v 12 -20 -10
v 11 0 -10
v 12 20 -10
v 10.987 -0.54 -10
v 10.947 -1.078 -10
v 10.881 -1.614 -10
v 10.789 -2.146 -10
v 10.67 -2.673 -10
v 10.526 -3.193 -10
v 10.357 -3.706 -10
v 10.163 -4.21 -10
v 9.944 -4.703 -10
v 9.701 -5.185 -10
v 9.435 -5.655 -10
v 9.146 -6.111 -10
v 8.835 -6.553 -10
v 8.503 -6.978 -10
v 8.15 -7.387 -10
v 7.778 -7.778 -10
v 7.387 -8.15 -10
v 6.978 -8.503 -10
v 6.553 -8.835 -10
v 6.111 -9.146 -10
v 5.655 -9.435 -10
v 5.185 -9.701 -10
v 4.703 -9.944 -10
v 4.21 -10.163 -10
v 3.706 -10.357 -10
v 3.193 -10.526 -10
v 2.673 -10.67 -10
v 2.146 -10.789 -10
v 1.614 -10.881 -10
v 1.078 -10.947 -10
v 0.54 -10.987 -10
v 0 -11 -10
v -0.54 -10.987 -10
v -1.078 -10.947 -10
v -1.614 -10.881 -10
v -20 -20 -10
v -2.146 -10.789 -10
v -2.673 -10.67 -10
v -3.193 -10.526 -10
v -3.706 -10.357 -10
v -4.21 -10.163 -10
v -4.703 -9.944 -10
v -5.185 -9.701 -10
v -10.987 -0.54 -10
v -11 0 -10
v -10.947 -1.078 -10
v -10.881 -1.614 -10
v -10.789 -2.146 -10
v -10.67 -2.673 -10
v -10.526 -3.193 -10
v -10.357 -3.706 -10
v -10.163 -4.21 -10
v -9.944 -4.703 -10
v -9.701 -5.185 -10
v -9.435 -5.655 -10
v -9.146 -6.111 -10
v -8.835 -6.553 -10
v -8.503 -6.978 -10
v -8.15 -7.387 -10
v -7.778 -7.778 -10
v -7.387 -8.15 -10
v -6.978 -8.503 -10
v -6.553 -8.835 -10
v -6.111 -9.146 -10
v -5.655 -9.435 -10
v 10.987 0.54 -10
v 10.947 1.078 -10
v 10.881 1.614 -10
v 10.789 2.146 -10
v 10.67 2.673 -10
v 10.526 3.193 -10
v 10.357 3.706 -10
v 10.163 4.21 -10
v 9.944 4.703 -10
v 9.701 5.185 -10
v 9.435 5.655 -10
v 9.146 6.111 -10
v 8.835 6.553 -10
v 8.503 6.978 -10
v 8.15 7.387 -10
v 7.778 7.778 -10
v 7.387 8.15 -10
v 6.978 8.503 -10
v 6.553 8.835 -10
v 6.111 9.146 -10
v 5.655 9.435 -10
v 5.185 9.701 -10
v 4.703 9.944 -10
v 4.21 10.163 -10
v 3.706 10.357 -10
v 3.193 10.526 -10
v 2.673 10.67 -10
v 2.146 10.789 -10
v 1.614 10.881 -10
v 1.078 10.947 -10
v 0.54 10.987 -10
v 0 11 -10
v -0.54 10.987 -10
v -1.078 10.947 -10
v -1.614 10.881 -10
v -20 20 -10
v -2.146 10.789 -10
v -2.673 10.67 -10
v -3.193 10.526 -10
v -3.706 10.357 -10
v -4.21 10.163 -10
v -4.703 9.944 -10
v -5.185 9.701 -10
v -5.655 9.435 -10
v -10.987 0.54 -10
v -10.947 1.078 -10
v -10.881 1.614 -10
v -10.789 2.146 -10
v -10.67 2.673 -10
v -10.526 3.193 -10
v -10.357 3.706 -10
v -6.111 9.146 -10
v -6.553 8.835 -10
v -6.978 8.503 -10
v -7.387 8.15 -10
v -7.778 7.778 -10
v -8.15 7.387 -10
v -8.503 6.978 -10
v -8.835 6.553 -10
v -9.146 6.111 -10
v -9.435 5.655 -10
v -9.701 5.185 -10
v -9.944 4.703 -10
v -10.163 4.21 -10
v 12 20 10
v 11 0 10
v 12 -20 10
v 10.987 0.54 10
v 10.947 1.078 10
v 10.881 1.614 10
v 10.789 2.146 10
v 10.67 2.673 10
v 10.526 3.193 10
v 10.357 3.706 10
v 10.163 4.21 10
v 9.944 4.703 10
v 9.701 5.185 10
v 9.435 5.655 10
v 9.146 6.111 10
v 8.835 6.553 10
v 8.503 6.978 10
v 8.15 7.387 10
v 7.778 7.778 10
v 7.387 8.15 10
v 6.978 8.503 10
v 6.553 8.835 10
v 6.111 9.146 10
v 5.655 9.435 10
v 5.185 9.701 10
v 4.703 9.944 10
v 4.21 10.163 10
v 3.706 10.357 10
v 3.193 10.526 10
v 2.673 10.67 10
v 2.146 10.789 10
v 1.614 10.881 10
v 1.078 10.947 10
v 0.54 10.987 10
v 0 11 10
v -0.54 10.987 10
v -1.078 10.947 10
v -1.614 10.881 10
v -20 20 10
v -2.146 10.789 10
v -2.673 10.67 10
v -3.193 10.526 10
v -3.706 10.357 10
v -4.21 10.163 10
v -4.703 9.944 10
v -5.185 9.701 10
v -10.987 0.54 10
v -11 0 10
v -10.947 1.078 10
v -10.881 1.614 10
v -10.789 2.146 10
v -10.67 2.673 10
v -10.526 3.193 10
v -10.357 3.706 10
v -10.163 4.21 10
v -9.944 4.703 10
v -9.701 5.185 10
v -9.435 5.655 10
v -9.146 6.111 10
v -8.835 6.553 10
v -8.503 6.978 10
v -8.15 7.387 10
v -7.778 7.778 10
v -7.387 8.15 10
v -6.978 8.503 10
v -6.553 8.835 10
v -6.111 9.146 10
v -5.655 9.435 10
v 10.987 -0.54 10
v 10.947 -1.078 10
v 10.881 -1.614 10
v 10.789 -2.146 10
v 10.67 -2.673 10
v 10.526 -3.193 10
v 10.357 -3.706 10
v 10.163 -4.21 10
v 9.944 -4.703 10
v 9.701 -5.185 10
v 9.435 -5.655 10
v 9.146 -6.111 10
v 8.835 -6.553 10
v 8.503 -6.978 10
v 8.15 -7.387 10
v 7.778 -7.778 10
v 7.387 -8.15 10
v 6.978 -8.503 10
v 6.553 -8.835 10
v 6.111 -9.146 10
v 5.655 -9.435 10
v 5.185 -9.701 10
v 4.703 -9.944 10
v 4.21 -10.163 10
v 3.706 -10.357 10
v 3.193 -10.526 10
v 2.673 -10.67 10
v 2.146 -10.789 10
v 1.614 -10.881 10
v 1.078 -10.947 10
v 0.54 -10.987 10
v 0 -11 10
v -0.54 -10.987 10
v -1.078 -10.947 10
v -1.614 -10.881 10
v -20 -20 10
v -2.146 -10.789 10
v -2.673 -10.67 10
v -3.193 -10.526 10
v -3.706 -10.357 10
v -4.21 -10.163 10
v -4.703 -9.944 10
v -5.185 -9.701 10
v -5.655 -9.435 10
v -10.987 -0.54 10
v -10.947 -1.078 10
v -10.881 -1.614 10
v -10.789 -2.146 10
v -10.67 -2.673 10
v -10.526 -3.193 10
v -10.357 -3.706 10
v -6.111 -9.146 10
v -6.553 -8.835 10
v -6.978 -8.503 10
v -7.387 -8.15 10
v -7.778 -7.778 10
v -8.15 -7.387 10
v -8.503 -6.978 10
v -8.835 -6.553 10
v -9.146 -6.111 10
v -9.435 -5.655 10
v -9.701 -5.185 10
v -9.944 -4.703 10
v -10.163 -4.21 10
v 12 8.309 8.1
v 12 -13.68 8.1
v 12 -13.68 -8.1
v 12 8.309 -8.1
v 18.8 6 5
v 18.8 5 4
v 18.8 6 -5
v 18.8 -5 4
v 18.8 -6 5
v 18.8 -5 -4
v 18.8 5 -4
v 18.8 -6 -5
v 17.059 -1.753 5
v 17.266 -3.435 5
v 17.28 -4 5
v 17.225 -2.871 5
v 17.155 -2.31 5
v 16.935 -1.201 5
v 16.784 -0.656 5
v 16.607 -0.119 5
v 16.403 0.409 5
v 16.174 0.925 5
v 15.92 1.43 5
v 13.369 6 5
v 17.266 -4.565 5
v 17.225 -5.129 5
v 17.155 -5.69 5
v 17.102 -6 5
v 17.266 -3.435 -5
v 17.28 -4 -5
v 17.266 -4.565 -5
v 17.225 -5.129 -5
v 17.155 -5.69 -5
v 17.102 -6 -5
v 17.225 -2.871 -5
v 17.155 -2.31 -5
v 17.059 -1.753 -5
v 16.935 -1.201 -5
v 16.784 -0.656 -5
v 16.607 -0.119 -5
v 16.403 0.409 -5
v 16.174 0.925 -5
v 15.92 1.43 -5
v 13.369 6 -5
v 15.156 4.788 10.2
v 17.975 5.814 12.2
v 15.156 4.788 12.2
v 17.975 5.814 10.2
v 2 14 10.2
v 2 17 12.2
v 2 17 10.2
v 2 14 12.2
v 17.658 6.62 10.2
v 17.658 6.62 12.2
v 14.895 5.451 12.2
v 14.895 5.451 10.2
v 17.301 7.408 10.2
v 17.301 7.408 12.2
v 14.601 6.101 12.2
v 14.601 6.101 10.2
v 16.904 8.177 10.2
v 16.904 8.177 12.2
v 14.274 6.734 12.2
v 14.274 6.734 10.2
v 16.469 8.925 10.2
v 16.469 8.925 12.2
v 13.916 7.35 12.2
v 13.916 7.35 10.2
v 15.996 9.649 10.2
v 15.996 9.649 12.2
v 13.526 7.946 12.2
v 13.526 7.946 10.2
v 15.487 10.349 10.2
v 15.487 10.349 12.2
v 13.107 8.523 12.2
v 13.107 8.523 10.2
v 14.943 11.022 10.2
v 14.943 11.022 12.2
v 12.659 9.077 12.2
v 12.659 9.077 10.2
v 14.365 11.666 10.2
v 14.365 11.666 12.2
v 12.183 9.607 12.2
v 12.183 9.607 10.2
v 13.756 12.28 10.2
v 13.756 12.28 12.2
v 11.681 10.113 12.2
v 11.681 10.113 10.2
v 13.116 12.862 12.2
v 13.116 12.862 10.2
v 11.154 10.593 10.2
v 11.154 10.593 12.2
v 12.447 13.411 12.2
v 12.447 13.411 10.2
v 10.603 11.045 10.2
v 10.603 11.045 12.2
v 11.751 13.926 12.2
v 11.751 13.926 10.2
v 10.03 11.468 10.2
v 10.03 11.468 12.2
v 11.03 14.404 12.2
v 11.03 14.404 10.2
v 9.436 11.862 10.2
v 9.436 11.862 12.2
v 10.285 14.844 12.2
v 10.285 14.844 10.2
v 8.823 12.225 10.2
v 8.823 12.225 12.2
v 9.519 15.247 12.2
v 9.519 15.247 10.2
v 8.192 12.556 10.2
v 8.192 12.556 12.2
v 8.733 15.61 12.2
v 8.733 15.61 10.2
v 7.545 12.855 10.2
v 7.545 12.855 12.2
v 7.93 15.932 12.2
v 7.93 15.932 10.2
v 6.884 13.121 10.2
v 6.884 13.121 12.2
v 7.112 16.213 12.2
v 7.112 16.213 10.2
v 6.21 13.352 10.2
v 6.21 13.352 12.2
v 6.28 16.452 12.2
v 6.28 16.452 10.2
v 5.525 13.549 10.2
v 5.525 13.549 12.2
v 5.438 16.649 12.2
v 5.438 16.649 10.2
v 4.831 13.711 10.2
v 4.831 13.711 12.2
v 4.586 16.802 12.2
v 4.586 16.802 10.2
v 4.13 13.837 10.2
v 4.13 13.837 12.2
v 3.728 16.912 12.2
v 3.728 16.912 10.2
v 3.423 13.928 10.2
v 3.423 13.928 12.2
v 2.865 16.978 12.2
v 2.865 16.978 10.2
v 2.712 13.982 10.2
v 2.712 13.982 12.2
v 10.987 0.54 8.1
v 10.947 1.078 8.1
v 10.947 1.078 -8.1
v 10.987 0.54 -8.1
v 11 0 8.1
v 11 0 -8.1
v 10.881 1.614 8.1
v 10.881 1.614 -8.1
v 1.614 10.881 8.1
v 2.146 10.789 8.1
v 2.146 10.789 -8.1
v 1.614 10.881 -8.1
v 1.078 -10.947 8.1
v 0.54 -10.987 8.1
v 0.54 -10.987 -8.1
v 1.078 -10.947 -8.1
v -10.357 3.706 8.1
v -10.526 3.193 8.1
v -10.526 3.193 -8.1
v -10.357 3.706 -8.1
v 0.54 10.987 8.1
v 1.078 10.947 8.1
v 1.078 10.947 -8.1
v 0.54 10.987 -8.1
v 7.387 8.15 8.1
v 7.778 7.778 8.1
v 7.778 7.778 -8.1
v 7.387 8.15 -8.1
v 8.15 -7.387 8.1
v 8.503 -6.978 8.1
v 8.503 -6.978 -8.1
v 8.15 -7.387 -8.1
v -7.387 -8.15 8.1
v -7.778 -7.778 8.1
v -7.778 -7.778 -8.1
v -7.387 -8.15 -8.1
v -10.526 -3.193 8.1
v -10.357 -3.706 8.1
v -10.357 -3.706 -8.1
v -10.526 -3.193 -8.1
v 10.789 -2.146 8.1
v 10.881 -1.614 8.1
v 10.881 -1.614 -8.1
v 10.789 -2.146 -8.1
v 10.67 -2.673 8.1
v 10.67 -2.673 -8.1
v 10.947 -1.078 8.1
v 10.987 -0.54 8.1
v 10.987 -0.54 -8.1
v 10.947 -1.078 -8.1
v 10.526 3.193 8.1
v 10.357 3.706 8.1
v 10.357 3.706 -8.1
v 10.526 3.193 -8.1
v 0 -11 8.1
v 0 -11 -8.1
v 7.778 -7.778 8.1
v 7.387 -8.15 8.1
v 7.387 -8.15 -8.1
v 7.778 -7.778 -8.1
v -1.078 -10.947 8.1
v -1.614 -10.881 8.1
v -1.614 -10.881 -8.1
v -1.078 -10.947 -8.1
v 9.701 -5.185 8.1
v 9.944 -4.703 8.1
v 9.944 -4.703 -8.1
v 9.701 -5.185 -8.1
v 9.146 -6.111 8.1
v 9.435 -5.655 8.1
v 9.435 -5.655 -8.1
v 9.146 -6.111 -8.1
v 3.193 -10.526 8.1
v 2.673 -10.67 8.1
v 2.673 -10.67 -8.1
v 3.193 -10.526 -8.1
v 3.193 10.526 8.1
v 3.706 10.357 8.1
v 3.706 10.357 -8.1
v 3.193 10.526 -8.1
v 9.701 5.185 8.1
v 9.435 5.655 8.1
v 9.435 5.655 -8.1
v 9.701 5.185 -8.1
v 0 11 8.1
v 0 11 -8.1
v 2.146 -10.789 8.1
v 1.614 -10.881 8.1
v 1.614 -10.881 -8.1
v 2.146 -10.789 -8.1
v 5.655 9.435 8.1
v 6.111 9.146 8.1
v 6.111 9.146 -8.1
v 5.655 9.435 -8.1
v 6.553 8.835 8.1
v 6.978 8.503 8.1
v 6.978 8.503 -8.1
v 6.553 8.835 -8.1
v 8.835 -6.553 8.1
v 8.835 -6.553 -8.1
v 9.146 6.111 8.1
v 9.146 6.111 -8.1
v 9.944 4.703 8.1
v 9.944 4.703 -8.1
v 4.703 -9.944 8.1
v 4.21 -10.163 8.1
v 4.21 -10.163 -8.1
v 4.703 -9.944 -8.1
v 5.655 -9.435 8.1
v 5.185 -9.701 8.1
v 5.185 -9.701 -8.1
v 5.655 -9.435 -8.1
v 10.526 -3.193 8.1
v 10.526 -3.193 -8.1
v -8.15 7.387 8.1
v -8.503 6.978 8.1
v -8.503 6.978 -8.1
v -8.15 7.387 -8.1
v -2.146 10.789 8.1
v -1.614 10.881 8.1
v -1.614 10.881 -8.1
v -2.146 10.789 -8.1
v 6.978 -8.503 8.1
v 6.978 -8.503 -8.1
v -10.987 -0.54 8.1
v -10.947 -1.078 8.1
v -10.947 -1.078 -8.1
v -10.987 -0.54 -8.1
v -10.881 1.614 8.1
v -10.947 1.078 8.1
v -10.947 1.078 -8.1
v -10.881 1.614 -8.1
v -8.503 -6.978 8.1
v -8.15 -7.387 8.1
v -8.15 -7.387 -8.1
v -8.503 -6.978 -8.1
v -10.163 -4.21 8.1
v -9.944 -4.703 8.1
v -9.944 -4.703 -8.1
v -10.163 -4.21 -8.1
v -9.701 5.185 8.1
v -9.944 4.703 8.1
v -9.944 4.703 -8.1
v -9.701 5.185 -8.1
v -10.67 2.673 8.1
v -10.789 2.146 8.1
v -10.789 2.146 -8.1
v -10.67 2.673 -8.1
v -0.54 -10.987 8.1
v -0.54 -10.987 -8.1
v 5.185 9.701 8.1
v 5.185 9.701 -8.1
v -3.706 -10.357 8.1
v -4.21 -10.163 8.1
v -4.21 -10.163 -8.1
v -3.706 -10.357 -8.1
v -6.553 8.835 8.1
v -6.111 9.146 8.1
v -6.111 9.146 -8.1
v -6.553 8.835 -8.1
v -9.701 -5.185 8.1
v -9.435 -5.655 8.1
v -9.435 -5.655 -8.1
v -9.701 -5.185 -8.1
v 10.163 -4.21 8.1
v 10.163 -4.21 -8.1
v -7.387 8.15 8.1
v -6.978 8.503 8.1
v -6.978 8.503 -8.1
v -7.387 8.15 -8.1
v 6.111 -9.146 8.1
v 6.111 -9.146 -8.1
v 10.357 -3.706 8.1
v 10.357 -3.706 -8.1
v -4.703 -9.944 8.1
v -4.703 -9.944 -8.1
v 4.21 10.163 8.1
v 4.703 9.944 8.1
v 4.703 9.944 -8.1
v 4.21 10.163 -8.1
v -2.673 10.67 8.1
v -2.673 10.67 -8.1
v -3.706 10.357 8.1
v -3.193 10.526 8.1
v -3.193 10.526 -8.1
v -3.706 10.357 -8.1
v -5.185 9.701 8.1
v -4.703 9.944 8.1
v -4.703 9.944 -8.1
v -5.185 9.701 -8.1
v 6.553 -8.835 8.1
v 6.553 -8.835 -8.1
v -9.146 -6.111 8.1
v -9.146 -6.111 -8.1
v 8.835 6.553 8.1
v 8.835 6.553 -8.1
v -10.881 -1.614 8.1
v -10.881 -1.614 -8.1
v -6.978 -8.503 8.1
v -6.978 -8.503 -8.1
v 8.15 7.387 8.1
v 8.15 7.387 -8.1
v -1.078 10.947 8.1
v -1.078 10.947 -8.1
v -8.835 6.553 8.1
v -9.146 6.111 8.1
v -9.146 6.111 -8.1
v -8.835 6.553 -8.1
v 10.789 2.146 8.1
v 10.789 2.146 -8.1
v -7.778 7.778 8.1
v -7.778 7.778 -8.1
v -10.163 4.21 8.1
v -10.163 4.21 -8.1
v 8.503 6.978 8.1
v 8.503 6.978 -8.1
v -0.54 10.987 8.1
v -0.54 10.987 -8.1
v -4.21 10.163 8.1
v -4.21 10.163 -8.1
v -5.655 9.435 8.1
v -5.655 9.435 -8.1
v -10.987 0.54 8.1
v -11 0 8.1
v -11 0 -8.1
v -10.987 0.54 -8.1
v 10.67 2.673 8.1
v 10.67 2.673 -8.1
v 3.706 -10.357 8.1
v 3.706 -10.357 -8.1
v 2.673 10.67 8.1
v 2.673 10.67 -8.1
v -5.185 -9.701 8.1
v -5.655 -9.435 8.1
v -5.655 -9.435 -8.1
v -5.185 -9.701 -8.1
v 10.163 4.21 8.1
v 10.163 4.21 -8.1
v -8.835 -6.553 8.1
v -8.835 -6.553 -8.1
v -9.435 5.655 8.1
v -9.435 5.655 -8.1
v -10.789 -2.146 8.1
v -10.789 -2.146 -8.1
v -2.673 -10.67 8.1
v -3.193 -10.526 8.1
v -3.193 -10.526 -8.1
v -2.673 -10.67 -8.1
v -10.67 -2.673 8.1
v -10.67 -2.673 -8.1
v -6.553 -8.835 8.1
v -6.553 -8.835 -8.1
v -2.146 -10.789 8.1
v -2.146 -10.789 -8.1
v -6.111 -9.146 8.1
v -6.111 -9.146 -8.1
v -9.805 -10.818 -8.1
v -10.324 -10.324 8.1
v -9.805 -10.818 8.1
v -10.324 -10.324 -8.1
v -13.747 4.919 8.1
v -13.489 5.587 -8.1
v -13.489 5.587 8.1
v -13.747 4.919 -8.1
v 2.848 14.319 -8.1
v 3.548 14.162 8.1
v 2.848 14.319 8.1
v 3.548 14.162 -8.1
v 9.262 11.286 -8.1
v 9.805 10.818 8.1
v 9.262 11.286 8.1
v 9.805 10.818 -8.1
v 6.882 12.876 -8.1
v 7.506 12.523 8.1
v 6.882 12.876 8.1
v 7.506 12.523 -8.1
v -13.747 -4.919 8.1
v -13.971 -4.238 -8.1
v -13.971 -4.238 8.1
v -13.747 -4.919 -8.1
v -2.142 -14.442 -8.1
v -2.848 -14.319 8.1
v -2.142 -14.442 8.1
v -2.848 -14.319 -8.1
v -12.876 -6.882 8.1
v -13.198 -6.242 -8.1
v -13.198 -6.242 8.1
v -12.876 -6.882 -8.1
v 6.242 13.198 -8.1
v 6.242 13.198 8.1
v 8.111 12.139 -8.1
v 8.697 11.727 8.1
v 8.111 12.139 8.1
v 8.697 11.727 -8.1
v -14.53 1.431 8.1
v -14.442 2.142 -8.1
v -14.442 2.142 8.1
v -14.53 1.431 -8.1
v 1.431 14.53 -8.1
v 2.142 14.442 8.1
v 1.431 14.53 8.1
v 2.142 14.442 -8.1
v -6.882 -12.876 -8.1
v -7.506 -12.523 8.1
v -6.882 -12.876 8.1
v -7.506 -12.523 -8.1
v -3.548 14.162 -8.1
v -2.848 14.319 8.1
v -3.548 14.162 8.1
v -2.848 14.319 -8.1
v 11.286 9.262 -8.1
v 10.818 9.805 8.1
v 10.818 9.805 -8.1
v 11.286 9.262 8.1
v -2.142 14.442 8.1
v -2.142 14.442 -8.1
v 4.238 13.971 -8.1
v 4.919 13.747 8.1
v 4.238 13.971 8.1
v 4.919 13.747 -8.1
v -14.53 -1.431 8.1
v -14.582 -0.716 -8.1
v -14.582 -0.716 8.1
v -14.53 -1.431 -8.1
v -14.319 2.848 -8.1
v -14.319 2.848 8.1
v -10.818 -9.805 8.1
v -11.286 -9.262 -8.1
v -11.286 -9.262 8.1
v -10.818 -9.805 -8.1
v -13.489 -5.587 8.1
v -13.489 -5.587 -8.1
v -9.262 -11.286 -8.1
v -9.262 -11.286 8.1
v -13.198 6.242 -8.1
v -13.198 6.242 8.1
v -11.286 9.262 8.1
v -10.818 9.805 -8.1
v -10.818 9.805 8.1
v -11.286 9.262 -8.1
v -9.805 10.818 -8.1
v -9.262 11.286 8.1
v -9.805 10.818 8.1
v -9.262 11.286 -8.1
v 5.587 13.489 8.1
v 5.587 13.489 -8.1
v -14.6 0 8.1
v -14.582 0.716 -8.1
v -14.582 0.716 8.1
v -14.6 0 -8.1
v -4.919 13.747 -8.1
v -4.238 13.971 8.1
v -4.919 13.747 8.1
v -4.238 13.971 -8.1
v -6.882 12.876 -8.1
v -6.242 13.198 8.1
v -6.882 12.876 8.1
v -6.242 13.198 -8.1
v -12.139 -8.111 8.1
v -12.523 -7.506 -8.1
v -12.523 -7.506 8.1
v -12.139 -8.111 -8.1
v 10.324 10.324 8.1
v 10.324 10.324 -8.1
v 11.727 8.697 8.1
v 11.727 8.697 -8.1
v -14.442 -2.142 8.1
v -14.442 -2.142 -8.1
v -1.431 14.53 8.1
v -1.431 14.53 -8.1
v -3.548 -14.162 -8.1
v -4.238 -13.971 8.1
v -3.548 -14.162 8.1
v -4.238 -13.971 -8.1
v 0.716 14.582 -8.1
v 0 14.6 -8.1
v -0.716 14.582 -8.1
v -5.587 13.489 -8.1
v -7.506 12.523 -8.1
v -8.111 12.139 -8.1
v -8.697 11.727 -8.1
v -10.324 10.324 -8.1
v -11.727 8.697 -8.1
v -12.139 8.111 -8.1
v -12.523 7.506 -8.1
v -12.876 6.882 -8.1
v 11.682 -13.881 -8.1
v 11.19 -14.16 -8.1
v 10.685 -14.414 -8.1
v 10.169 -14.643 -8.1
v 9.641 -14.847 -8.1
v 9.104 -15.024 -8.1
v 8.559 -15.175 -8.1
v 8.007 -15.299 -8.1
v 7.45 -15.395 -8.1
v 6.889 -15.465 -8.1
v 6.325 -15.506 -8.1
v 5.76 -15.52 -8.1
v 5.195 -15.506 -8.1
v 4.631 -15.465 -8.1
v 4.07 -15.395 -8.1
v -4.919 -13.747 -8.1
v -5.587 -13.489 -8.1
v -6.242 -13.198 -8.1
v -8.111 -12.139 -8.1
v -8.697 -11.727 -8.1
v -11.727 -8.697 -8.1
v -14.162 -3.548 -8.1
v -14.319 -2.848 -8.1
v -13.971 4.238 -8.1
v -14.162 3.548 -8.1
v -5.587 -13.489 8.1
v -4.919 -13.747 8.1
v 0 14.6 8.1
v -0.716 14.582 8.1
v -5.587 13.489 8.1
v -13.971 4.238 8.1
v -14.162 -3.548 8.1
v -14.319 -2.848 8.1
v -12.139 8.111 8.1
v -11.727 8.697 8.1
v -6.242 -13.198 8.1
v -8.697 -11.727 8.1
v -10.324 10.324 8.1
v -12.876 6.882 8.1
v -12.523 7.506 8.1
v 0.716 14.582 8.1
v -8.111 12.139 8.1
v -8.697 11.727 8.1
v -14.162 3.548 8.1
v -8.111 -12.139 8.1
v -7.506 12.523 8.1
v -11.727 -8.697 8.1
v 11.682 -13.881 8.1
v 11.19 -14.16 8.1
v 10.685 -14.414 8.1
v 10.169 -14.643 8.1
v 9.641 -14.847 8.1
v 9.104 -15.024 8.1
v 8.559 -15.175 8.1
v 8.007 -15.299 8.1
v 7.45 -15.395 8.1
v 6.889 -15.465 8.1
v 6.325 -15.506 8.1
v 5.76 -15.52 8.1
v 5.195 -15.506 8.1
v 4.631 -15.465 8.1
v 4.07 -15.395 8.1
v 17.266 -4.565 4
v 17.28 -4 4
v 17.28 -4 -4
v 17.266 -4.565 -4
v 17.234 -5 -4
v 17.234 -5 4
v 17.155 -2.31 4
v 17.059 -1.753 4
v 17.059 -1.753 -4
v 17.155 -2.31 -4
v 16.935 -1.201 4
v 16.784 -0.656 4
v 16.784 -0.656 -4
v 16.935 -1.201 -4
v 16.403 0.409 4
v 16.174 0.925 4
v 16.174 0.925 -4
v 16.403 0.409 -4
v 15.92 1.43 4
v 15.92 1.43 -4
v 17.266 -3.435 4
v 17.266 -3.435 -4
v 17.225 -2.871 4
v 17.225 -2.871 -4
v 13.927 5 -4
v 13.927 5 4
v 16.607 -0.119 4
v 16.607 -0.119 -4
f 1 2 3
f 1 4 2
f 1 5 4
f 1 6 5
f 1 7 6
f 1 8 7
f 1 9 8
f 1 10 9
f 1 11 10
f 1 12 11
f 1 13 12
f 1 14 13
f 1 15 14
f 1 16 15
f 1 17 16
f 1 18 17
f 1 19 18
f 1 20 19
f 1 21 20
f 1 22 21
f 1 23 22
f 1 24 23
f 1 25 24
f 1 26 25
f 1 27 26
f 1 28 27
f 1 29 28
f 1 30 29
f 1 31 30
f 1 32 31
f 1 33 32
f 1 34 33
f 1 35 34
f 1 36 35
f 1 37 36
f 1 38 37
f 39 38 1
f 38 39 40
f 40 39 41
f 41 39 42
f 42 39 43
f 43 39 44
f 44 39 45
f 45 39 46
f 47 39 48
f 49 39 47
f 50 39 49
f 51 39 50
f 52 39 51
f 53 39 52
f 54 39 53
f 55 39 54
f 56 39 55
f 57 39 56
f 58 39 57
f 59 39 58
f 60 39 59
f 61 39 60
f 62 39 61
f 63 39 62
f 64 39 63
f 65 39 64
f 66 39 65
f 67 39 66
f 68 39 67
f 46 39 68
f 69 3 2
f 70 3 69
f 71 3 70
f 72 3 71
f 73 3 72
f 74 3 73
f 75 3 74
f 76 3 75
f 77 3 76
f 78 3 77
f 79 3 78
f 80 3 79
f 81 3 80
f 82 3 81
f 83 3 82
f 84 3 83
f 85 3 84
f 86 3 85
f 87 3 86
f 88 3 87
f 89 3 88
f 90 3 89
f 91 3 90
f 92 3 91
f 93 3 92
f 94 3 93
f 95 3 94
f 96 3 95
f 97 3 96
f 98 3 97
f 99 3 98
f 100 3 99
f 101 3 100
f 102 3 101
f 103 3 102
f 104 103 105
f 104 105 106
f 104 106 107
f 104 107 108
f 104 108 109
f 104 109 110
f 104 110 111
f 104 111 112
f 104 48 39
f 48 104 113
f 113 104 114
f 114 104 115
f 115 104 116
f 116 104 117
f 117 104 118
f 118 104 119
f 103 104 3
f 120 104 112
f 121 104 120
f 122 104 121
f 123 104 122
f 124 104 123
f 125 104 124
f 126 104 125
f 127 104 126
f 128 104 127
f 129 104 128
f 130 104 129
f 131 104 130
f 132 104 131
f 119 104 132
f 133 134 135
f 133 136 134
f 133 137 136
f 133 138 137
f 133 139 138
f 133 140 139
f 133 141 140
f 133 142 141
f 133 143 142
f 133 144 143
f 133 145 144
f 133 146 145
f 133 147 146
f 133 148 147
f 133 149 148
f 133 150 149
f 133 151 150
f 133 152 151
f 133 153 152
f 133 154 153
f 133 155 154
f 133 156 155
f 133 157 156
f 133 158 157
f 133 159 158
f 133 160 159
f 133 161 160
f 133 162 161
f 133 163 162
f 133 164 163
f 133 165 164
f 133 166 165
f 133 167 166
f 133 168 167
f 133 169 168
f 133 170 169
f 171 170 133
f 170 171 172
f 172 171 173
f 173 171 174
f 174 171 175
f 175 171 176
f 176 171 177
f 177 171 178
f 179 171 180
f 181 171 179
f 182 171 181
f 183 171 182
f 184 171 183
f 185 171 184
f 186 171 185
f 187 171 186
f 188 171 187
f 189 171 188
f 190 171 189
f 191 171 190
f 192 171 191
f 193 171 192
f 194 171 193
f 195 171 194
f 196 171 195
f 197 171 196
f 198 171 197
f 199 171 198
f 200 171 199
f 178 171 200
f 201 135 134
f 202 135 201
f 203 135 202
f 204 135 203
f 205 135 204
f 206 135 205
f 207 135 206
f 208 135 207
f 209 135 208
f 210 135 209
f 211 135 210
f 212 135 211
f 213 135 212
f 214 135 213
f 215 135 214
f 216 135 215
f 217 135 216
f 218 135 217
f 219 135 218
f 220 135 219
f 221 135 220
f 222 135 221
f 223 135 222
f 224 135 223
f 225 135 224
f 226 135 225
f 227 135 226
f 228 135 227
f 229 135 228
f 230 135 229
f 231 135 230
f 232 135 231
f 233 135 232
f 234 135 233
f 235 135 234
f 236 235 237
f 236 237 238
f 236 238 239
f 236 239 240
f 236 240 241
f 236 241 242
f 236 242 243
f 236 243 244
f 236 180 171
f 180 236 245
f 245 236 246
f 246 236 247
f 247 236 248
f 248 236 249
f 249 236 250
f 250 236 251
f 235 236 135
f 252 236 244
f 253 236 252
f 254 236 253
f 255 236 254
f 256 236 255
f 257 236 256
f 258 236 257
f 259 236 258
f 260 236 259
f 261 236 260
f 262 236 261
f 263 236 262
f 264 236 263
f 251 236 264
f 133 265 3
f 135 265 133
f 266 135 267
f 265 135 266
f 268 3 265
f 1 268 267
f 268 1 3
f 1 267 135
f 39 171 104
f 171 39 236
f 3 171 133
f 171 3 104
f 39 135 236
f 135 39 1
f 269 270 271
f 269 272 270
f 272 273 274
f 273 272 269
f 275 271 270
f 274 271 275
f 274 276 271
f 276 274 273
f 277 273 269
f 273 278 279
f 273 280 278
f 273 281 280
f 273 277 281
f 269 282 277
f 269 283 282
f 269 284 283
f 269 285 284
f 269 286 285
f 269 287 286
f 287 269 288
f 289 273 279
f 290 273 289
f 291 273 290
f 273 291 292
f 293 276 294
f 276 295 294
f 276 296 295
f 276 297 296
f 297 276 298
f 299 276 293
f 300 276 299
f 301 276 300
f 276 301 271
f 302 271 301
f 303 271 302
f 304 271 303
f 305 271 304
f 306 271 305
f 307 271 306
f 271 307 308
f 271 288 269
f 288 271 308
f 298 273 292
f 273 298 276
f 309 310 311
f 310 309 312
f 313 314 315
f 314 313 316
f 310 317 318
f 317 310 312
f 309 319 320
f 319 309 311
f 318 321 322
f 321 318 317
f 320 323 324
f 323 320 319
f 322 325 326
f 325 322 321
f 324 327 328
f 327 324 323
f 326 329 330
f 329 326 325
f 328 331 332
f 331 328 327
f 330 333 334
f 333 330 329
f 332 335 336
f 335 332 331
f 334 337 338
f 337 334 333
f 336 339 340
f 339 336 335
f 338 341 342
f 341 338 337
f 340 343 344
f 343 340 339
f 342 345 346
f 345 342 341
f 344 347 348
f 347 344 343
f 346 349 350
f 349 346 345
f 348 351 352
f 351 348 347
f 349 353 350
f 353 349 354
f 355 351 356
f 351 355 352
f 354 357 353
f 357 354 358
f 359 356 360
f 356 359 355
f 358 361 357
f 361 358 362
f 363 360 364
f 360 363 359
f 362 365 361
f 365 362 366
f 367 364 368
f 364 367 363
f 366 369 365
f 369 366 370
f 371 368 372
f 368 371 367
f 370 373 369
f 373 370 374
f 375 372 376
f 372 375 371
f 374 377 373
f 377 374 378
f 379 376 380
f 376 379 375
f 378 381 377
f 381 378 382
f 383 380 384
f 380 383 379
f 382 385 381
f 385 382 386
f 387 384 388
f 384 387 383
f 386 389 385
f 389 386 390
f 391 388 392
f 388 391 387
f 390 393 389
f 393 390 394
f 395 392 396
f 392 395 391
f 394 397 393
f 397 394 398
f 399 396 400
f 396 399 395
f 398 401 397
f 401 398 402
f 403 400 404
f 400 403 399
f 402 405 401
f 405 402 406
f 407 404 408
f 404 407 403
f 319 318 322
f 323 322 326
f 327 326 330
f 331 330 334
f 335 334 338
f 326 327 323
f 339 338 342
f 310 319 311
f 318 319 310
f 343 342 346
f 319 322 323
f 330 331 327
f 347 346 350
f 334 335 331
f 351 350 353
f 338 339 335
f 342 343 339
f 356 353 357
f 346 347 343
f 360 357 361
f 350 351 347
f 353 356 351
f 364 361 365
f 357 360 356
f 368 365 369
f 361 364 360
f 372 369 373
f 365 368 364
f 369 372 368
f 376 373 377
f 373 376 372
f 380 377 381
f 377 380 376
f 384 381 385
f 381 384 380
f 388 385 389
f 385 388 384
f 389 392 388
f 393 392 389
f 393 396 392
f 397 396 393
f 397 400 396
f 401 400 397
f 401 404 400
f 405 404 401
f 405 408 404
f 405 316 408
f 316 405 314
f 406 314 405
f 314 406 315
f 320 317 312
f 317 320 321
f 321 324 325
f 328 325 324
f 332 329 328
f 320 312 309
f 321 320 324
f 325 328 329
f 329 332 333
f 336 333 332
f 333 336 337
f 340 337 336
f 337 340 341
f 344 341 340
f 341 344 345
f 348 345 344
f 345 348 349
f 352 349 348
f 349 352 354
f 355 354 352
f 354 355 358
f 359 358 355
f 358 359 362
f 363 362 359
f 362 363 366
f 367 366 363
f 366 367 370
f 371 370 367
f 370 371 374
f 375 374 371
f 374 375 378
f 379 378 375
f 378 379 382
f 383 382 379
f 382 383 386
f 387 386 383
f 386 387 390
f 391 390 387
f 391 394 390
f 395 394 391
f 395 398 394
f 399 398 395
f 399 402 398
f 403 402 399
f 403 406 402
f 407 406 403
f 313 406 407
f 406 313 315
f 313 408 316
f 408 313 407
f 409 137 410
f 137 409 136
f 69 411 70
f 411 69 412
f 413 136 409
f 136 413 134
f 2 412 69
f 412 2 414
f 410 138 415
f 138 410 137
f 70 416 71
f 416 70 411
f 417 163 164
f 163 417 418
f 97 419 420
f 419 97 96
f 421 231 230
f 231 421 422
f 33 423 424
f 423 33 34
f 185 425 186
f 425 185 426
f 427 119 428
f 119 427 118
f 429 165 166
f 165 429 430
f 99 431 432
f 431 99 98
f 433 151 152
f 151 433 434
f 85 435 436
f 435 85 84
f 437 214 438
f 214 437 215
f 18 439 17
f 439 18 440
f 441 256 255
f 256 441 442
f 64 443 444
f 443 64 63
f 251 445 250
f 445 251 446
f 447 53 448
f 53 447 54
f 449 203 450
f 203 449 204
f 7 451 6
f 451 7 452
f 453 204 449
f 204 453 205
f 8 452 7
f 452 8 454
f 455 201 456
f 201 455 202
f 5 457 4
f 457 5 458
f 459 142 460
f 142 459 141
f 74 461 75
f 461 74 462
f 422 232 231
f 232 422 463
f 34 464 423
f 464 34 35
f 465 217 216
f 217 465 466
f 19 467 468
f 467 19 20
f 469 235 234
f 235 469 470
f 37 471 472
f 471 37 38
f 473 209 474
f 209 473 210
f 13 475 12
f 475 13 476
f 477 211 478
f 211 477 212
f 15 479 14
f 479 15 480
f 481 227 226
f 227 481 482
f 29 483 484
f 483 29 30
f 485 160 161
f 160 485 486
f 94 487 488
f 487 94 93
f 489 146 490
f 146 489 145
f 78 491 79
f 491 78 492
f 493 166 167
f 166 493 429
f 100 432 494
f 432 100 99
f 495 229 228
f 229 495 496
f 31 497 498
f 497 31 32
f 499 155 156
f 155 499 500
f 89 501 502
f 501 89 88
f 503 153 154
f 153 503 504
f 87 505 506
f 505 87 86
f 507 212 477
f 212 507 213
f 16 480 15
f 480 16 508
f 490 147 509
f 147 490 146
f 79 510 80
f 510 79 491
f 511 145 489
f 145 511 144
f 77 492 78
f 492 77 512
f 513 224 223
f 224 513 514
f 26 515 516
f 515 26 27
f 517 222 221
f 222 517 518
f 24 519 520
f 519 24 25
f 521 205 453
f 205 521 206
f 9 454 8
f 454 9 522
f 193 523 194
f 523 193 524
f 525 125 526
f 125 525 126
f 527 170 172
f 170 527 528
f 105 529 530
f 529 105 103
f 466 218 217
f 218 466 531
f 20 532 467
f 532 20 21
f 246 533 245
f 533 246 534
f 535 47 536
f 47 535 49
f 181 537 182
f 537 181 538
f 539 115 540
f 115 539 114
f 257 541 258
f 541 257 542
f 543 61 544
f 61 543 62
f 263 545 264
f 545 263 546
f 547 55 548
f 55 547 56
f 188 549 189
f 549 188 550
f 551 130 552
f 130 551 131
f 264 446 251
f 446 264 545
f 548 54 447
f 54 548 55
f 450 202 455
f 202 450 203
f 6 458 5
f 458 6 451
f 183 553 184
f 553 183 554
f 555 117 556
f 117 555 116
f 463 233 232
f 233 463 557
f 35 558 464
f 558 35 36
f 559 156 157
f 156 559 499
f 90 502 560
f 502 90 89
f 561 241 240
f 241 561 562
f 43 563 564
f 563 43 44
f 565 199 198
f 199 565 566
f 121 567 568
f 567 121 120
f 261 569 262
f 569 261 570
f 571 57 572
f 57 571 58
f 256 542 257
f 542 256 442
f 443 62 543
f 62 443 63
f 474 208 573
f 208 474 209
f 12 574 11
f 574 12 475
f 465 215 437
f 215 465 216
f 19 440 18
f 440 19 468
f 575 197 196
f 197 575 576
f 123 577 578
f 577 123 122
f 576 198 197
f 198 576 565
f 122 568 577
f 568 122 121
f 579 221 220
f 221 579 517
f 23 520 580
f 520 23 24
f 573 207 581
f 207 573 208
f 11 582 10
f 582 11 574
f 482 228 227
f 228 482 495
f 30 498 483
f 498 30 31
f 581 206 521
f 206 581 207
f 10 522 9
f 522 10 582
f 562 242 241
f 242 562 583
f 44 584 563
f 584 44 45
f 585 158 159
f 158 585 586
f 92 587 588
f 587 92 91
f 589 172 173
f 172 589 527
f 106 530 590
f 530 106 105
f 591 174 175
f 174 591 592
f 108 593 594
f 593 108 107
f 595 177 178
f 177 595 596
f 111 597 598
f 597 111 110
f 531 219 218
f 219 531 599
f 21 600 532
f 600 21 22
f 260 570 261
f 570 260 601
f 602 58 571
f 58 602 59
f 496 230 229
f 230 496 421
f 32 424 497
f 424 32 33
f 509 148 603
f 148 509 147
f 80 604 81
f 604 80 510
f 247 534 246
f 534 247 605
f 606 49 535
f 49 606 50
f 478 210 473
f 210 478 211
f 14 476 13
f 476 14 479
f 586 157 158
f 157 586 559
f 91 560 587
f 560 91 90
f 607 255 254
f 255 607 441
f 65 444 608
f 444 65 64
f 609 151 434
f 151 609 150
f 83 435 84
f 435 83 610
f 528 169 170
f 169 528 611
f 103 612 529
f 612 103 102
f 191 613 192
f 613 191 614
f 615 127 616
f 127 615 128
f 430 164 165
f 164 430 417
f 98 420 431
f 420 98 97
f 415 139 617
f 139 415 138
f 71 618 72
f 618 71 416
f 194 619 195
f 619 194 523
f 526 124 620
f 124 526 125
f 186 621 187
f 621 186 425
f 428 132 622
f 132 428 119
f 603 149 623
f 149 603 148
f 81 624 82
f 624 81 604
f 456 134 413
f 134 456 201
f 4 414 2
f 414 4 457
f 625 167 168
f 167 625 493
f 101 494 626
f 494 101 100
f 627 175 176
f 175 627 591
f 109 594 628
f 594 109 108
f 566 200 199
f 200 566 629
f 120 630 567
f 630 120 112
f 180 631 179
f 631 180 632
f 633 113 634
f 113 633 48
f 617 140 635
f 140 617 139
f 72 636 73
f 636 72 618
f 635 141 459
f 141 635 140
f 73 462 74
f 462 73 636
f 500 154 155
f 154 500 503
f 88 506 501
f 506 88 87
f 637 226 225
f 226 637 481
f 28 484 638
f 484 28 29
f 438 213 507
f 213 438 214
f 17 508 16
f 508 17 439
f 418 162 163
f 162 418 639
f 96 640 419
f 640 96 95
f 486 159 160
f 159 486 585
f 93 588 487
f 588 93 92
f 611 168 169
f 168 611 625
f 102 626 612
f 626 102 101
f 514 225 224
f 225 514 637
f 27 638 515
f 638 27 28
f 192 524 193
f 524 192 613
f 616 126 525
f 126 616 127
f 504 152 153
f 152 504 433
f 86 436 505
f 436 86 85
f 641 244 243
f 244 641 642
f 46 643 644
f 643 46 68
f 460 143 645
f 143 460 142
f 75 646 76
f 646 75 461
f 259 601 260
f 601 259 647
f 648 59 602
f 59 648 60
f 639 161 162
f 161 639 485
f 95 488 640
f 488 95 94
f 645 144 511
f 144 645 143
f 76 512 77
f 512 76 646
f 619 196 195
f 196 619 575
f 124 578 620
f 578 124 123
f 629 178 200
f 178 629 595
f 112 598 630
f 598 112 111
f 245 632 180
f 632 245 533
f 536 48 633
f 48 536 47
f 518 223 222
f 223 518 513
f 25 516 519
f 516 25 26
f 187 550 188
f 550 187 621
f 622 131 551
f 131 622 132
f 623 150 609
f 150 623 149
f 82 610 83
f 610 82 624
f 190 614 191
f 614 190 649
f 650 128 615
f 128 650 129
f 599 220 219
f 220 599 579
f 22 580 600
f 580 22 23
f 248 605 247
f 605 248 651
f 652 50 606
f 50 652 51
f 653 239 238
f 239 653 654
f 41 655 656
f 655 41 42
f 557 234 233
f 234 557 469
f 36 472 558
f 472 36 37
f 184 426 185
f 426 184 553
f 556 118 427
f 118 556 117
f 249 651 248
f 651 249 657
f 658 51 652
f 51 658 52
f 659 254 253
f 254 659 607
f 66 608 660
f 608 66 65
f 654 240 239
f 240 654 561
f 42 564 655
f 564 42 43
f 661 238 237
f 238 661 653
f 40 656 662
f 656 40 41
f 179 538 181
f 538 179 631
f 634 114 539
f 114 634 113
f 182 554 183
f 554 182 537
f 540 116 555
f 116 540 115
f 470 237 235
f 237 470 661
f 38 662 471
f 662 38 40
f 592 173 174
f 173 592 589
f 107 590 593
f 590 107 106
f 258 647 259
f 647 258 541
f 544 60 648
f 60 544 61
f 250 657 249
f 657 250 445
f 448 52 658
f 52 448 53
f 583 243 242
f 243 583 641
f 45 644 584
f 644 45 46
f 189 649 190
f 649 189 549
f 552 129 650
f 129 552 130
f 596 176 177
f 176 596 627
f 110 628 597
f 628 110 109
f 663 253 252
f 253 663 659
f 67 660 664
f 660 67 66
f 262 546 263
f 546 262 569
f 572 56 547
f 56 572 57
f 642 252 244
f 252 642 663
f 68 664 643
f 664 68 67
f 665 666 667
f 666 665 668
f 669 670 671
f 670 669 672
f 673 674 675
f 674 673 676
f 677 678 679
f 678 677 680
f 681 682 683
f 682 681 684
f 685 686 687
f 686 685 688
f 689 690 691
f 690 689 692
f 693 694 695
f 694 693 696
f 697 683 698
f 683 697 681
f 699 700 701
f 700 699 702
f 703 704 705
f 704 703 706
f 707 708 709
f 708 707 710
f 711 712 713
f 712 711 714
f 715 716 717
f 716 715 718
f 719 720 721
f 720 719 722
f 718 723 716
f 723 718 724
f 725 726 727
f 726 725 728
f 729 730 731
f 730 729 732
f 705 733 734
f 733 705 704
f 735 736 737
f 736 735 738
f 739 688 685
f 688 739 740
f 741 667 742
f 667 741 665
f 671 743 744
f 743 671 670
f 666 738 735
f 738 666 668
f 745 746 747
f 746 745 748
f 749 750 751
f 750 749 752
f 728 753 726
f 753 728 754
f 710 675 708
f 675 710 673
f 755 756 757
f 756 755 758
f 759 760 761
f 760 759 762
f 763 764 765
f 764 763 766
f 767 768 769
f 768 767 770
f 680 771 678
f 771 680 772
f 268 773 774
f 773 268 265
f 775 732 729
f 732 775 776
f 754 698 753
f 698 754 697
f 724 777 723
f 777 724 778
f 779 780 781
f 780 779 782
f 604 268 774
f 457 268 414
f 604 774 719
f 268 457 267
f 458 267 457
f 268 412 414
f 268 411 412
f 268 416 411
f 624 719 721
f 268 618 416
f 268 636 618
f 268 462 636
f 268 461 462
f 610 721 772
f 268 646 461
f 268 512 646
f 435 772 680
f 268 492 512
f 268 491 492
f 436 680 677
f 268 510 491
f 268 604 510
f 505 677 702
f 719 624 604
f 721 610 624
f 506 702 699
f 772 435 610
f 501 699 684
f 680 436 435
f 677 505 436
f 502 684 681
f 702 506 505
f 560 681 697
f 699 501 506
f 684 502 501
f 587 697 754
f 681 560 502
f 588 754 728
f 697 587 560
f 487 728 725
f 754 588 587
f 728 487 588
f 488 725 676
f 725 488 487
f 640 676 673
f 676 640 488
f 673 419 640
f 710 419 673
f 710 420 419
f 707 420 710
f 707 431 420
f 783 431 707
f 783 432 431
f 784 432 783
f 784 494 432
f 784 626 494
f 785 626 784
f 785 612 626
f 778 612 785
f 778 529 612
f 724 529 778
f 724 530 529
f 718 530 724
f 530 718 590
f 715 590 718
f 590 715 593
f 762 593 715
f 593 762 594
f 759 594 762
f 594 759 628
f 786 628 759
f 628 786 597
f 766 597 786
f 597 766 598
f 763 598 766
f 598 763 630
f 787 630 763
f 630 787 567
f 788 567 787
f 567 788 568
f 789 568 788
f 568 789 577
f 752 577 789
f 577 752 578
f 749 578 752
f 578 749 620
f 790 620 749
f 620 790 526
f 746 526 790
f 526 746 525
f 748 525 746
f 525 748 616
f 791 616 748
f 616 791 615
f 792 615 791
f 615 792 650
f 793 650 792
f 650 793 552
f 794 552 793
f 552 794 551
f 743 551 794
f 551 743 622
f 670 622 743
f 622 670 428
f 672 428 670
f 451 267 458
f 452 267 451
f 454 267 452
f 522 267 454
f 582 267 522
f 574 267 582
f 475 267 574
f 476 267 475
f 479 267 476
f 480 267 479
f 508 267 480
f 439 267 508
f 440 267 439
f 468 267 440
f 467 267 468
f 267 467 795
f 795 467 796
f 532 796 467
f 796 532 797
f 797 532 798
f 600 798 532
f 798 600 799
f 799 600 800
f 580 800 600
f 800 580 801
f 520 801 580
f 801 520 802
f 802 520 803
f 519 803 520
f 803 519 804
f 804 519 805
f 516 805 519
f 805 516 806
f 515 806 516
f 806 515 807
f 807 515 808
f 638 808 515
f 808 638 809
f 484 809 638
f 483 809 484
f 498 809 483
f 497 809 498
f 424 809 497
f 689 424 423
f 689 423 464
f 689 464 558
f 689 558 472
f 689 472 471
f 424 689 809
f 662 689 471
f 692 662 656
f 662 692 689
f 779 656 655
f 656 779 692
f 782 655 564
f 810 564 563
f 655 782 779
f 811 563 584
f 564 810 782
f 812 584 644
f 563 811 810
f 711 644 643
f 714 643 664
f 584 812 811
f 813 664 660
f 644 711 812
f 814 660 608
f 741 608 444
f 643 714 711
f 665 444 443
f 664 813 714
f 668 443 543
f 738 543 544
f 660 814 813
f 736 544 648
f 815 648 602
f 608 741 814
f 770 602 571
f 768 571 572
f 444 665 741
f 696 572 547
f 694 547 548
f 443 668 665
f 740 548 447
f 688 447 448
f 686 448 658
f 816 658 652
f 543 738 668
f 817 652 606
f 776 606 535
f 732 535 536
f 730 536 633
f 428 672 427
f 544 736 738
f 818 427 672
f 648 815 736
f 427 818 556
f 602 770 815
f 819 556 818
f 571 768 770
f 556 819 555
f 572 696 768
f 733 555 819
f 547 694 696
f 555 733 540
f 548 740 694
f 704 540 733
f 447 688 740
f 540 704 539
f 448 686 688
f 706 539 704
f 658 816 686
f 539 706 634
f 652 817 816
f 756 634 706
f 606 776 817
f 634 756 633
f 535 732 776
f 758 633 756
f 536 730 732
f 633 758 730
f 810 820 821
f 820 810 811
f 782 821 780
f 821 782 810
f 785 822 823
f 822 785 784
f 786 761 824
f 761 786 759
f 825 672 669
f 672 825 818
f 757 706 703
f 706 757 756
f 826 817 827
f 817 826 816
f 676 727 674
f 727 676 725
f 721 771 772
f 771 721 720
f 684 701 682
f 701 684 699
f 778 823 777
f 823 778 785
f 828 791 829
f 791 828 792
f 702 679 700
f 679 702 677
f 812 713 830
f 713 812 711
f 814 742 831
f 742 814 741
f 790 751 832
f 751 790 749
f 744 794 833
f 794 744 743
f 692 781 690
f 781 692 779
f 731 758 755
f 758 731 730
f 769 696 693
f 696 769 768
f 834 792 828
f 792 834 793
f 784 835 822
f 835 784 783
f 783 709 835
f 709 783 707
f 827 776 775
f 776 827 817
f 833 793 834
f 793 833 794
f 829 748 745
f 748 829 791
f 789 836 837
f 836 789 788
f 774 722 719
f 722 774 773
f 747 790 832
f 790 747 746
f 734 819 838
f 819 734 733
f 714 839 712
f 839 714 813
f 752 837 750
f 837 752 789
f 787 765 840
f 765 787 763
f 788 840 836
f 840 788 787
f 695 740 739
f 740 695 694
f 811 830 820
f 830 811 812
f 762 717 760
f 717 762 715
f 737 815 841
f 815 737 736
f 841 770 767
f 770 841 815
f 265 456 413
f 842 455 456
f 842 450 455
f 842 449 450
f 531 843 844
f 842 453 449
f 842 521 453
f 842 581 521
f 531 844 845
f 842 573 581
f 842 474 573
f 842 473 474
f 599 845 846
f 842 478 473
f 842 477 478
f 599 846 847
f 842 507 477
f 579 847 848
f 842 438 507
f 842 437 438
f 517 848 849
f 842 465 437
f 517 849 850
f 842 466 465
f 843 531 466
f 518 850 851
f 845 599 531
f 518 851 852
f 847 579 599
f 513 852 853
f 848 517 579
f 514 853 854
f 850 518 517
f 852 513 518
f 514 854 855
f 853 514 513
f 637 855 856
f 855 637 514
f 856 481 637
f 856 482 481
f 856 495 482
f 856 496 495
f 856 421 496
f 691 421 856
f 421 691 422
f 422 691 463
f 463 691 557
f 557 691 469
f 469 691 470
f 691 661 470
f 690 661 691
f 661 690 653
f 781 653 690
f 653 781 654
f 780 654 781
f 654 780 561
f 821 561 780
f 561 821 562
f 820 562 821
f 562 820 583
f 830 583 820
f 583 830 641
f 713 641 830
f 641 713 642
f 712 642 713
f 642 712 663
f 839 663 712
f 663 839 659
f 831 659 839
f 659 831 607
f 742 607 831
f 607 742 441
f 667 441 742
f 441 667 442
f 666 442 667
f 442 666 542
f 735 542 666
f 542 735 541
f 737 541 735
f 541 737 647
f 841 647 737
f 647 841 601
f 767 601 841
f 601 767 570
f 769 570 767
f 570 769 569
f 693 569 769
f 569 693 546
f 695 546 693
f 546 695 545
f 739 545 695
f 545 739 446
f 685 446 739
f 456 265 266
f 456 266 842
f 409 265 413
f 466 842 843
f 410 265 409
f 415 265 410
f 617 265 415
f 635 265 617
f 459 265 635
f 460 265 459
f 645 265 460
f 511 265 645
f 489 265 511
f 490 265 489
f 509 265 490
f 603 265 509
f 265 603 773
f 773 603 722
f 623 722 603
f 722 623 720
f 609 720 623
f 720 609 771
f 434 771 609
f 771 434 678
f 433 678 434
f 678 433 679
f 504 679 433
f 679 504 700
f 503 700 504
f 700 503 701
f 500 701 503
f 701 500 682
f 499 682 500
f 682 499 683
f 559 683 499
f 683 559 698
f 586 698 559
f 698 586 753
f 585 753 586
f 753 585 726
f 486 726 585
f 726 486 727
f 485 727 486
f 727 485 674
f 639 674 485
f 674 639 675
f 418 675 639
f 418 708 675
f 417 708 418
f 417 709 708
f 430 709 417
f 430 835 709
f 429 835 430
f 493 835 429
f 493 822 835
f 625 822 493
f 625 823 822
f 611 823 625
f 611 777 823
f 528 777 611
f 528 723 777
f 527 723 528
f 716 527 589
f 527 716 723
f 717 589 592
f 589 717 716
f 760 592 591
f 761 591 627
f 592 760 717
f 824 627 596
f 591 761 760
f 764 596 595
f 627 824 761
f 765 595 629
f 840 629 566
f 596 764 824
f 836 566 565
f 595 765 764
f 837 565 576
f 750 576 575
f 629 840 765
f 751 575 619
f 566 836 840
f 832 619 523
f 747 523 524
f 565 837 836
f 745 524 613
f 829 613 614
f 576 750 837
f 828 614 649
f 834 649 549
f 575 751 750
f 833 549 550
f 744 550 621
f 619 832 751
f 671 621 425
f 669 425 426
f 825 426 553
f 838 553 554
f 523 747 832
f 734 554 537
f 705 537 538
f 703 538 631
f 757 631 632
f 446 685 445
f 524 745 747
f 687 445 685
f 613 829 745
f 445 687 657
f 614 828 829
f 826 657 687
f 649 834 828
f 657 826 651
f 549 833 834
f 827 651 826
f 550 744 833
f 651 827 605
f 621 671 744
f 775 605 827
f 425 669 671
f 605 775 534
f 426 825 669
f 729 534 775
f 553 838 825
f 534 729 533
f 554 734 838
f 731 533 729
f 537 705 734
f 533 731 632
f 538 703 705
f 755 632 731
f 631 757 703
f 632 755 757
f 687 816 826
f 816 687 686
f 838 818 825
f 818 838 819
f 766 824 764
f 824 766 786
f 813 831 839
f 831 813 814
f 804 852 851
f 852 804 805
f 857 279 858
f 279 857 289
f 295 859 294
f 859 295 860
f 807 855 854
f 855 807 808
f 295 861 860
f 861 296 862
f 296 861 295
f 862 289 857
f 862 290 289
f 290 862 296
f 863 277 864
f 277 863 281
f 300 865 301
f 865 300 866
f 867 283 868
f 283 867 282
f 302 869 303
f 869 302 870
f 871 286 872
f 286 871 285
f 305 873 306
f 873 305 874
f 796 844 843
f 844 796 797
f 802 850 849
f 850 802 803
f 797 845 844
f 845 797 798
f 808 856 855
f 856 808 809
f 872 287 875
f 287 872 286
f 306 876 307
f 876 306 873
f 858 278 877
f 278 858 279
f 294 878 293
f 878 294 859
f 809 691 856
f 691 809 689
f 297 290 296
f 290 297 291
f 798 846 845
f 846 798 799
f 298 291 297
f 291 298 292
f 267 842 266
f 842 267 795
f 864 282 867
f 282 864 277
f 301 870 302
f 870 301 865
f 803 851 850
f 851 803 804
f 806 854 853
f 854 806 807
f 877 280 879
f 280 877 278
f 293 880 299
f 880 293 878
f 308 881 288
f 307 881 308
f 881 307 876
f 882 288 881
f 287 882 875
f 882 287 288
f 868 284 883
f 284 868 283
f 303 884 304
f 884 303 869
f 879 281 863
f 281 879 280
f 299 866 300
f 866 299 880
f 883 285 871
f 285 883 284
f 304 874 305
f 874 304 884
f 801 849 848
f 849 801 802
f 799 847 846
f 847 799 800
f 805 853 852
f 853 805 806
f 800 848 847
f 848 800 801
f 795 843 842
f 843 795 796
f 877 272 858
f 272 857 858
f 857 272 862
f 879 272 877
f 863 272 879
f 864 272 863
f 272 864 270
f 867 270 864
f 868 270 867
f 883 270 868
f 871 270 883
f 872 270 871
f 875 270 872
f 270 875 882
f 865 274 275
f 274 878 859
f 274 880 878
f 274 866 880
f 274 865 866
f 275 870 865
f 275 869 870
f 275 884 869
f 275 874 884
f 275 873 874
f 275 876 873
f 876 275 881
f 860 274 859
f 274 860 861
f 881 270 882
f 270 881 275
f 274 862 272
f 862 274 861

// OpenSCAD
$fn = 128;

// Centrifugal blower fan target overall envelope: 40 x 40 x 20 mm (including outlet)
footprint_x = 40;
footprint_y = 40;
overall_thickness = 20;

// Casing / wall
wall = 2.0;
z_overlap = 1.2;          // robust overlap (1-2mm as required)
gap = 0.6;                // internal clearance

// Outlet (rectangular nozzle) - included in 40mm overall X
outlet_len = 8;           // protrusion beyond main body
outlet_w = 12;
outlet_h = 10;

// Main body X size so that body + outlet = 40
body_x = footprint_x - outlet_len;
body_y = footprint_y;
body_z = overall_thickness;

// Inlet (top/bottom circular opening)
inlet_d = 22;

// Impeller (visible through inlet)
impeller_d = 28;
impeller_th = 8;
hub_d = 10;
blade_count = 11;
blade_w = 2.2;
blade_overlap = 1.2;

// Volute / cavity sizing
cav_h = body_z - 2*wall;
cav_d1 = impeller_d + 2*gap;
cav_d2 = impeller_d*0.78 + 2*gap;

// Corner bumps (subtle mounting lugs)
corner_bump_r = 2.0;
corner_bump_h = 1.2;
corner_inset = 2.0;

// Derived placement (keep total envelope centered at origin)
body_center_x = -outlet_len/2;

// Place outlet so it overlaps the body by z_overlap (prevents visible separation)
outlet_center_x = body_center_x + body_x/2 + outlet_len/2 - z_overlap;

// Convenience: body +X face location
body_posx_face = body_center_x + body_x/2;

// --- FIX: attach the curved arc/duct segment to the main housing ---
// The "orange arc" seen floating in orthographic views is recreated here as a
// thin curved strap and is positioned to physically intersect the top of the
// main body with 1-2mm overlap.
arc_th = 2.0;                 // thickness in Z
arc_rad = inlet_d/2 + 3.0;    // radius around inlet
arc_w  = 3.0;                 // radial width of the strap
arc_ang = 70;                 // degrees of arc
arc_overlap = 1.2;            // guaranteed intersection with body

module impeller() {
    blade_len = (impeller_d - hub_d)/2;

    union() {
        cylinder(d=hub_d, h=impeller_th, center=true);
        cylinder(d=impeller_d*0.55, h=impeller_th*0.6, center=true);

        for (i = [0:blade_count-1]) {
            rotate([0,0,i*360/blade_count])
                translate([hub_d/2 + blade_len/2 - blade_overlap, 0, 0])
                    hull() {
                        translate([-blade_len*0.25, 0, 0])
                            cube([blade_len*0.5, blade_w, impeller_th], center=true);
                        translate([blade_len*0.25, blade_w*0.6, 0])
                            cube([blade_len*0.5, blade_w, impeller_th], center=true);
                    }
        }
    }
}

// Solid "bridge" that guarantees the outlet is physically attached to the main housing.
module outlet_root_bridge() {
    bridge_x = wall + z_overlap + 0.8;   // extra to guarantee intersection
    bridge_y = outlet_w;
    bridge_z = outlet_h;

    translate([body_posx_face + bridge_x/2 - z_overlap, 0, 0])
        cube([bridge_x, bridge_y, bridge_z], center=true);
}

// Curved arc/duct segment (previously floating) - now attached.
// Implemented as a ring-sector strap and placed so it intersects the top face
// of the main body by arc_overlap.
module attached_curved_arc() {
    // Place arc centered over the inlet (which is at global X=0 in this model),
    // and push it down so it intersects the top of the body.
    // Top face Z = +body_z/2. Arc center Z is set to top - arc_th/2 + overlap.
    arc_center_z = body_z/2 - arc_th/2 + arc_overlap;

    // Slightly bias toward +X so it visually sits near the outlet side,
    // but still intersects the main housing.
    arc_center_x = 0 + 2.0;

    translate([arc_center_x, 0, arc_center_z])
        rotate([0,0,20])  // small orientation similar to the shown offset piece
            rotate_extrude(angle=arc_ang, convexity=10)
                translate([arc_rad, 0, 0])
                    square([arc_w, arc_th], center=false);
}

module outer_shell() {
    union() {
        // Main casing block
        translate([body_center_x, 0, 0])
            cube([body_x, body_y, body_z], center=true);

        // Outlet nozzle (overlaps main casing by z_overlap)
        translate([outlet_center_x, 0, 0])
            cube([outlet_len, outlet_w, outlet_h], center=true);

        // Guaranteed physical attachment at the outlet root
        outlet_root_bridge();

        // FIX: add the curved arc/duct segment and ensure it is attached
        attached_curved_arc();

        // Corner bumps on both Z faces (connected)
        for (sx = [-1, 1], sy = [-1, 1], sz = [-1, 1]) {
            translate([body_center_x + sx*(body_x/2 - corner_inset),
                       sy*(body_y/2 - corner_inset),
                       sz*(body_z/2 - corner_bump_h/2)])
                cylinder(r=corner_bump_r, h=corner_bump_h, center=true);
        }
    }
}

module internal_voids() {
    union() {
        // Inlet through-hole along Z (top/bottom)
        cylinder(d=inlet_d, h=body_z + 2, center=true);

        // Main impeller cavity (cylindrical)
        cylinder(d=cav_d1, h=cav_h + 0.2, center=true);

        // Volute-like expansion toward outlet
        hull() {
            cylinder(d=cav_d1, h=cav_h + 0.2, center=true);
            translate([body_x*0.18, -body_y*0.10, 0])
                cylinder(d=cav_d2, h=cav_h + 0.2, center=true);
        }

        // Outlet passage (connects cavity to nozzle)
        translate([outlet_center_x - z_overlap/2, 0, 0])
            cube([outlet_len + 2 + z_overlap, outlet_w - 2, outlet_h - 2], center=true);

        // Tongue from cavity to outlet to ensure clear connection
        translate([body_posx_face - wall + z_overlap/2, 0, 0])
            cube([2*wall + 2 + z_overlap, outlet_w - 2, outlet_h - 2], center=true);
    }
}

module blower_fan() {
    difference() {
        union() {
            outer_shell();

            // Impeller inside (kept within internal cavity region)
            intersection() {
                translate([body_center_x, 0, 0])
                    cube([body_x - 2*wall, body_y - 2*wall, body_z - 2*wall], center=true);
                impeller();
            }

            // Axle/strut to connect impeller to casing (prevents floating solid)
            translate([0, 0, (impeller_th/2 + (body_z/2 - wall))/2])
                cylinder(d=3.0,
                         h=(body_z/2 - wall) - impeller_th/2 + 2*z_overlap,
                         center=true);
        }

        // Subtract internal cavities and ports
        internal_voids();
    }
}

blower_fan();
